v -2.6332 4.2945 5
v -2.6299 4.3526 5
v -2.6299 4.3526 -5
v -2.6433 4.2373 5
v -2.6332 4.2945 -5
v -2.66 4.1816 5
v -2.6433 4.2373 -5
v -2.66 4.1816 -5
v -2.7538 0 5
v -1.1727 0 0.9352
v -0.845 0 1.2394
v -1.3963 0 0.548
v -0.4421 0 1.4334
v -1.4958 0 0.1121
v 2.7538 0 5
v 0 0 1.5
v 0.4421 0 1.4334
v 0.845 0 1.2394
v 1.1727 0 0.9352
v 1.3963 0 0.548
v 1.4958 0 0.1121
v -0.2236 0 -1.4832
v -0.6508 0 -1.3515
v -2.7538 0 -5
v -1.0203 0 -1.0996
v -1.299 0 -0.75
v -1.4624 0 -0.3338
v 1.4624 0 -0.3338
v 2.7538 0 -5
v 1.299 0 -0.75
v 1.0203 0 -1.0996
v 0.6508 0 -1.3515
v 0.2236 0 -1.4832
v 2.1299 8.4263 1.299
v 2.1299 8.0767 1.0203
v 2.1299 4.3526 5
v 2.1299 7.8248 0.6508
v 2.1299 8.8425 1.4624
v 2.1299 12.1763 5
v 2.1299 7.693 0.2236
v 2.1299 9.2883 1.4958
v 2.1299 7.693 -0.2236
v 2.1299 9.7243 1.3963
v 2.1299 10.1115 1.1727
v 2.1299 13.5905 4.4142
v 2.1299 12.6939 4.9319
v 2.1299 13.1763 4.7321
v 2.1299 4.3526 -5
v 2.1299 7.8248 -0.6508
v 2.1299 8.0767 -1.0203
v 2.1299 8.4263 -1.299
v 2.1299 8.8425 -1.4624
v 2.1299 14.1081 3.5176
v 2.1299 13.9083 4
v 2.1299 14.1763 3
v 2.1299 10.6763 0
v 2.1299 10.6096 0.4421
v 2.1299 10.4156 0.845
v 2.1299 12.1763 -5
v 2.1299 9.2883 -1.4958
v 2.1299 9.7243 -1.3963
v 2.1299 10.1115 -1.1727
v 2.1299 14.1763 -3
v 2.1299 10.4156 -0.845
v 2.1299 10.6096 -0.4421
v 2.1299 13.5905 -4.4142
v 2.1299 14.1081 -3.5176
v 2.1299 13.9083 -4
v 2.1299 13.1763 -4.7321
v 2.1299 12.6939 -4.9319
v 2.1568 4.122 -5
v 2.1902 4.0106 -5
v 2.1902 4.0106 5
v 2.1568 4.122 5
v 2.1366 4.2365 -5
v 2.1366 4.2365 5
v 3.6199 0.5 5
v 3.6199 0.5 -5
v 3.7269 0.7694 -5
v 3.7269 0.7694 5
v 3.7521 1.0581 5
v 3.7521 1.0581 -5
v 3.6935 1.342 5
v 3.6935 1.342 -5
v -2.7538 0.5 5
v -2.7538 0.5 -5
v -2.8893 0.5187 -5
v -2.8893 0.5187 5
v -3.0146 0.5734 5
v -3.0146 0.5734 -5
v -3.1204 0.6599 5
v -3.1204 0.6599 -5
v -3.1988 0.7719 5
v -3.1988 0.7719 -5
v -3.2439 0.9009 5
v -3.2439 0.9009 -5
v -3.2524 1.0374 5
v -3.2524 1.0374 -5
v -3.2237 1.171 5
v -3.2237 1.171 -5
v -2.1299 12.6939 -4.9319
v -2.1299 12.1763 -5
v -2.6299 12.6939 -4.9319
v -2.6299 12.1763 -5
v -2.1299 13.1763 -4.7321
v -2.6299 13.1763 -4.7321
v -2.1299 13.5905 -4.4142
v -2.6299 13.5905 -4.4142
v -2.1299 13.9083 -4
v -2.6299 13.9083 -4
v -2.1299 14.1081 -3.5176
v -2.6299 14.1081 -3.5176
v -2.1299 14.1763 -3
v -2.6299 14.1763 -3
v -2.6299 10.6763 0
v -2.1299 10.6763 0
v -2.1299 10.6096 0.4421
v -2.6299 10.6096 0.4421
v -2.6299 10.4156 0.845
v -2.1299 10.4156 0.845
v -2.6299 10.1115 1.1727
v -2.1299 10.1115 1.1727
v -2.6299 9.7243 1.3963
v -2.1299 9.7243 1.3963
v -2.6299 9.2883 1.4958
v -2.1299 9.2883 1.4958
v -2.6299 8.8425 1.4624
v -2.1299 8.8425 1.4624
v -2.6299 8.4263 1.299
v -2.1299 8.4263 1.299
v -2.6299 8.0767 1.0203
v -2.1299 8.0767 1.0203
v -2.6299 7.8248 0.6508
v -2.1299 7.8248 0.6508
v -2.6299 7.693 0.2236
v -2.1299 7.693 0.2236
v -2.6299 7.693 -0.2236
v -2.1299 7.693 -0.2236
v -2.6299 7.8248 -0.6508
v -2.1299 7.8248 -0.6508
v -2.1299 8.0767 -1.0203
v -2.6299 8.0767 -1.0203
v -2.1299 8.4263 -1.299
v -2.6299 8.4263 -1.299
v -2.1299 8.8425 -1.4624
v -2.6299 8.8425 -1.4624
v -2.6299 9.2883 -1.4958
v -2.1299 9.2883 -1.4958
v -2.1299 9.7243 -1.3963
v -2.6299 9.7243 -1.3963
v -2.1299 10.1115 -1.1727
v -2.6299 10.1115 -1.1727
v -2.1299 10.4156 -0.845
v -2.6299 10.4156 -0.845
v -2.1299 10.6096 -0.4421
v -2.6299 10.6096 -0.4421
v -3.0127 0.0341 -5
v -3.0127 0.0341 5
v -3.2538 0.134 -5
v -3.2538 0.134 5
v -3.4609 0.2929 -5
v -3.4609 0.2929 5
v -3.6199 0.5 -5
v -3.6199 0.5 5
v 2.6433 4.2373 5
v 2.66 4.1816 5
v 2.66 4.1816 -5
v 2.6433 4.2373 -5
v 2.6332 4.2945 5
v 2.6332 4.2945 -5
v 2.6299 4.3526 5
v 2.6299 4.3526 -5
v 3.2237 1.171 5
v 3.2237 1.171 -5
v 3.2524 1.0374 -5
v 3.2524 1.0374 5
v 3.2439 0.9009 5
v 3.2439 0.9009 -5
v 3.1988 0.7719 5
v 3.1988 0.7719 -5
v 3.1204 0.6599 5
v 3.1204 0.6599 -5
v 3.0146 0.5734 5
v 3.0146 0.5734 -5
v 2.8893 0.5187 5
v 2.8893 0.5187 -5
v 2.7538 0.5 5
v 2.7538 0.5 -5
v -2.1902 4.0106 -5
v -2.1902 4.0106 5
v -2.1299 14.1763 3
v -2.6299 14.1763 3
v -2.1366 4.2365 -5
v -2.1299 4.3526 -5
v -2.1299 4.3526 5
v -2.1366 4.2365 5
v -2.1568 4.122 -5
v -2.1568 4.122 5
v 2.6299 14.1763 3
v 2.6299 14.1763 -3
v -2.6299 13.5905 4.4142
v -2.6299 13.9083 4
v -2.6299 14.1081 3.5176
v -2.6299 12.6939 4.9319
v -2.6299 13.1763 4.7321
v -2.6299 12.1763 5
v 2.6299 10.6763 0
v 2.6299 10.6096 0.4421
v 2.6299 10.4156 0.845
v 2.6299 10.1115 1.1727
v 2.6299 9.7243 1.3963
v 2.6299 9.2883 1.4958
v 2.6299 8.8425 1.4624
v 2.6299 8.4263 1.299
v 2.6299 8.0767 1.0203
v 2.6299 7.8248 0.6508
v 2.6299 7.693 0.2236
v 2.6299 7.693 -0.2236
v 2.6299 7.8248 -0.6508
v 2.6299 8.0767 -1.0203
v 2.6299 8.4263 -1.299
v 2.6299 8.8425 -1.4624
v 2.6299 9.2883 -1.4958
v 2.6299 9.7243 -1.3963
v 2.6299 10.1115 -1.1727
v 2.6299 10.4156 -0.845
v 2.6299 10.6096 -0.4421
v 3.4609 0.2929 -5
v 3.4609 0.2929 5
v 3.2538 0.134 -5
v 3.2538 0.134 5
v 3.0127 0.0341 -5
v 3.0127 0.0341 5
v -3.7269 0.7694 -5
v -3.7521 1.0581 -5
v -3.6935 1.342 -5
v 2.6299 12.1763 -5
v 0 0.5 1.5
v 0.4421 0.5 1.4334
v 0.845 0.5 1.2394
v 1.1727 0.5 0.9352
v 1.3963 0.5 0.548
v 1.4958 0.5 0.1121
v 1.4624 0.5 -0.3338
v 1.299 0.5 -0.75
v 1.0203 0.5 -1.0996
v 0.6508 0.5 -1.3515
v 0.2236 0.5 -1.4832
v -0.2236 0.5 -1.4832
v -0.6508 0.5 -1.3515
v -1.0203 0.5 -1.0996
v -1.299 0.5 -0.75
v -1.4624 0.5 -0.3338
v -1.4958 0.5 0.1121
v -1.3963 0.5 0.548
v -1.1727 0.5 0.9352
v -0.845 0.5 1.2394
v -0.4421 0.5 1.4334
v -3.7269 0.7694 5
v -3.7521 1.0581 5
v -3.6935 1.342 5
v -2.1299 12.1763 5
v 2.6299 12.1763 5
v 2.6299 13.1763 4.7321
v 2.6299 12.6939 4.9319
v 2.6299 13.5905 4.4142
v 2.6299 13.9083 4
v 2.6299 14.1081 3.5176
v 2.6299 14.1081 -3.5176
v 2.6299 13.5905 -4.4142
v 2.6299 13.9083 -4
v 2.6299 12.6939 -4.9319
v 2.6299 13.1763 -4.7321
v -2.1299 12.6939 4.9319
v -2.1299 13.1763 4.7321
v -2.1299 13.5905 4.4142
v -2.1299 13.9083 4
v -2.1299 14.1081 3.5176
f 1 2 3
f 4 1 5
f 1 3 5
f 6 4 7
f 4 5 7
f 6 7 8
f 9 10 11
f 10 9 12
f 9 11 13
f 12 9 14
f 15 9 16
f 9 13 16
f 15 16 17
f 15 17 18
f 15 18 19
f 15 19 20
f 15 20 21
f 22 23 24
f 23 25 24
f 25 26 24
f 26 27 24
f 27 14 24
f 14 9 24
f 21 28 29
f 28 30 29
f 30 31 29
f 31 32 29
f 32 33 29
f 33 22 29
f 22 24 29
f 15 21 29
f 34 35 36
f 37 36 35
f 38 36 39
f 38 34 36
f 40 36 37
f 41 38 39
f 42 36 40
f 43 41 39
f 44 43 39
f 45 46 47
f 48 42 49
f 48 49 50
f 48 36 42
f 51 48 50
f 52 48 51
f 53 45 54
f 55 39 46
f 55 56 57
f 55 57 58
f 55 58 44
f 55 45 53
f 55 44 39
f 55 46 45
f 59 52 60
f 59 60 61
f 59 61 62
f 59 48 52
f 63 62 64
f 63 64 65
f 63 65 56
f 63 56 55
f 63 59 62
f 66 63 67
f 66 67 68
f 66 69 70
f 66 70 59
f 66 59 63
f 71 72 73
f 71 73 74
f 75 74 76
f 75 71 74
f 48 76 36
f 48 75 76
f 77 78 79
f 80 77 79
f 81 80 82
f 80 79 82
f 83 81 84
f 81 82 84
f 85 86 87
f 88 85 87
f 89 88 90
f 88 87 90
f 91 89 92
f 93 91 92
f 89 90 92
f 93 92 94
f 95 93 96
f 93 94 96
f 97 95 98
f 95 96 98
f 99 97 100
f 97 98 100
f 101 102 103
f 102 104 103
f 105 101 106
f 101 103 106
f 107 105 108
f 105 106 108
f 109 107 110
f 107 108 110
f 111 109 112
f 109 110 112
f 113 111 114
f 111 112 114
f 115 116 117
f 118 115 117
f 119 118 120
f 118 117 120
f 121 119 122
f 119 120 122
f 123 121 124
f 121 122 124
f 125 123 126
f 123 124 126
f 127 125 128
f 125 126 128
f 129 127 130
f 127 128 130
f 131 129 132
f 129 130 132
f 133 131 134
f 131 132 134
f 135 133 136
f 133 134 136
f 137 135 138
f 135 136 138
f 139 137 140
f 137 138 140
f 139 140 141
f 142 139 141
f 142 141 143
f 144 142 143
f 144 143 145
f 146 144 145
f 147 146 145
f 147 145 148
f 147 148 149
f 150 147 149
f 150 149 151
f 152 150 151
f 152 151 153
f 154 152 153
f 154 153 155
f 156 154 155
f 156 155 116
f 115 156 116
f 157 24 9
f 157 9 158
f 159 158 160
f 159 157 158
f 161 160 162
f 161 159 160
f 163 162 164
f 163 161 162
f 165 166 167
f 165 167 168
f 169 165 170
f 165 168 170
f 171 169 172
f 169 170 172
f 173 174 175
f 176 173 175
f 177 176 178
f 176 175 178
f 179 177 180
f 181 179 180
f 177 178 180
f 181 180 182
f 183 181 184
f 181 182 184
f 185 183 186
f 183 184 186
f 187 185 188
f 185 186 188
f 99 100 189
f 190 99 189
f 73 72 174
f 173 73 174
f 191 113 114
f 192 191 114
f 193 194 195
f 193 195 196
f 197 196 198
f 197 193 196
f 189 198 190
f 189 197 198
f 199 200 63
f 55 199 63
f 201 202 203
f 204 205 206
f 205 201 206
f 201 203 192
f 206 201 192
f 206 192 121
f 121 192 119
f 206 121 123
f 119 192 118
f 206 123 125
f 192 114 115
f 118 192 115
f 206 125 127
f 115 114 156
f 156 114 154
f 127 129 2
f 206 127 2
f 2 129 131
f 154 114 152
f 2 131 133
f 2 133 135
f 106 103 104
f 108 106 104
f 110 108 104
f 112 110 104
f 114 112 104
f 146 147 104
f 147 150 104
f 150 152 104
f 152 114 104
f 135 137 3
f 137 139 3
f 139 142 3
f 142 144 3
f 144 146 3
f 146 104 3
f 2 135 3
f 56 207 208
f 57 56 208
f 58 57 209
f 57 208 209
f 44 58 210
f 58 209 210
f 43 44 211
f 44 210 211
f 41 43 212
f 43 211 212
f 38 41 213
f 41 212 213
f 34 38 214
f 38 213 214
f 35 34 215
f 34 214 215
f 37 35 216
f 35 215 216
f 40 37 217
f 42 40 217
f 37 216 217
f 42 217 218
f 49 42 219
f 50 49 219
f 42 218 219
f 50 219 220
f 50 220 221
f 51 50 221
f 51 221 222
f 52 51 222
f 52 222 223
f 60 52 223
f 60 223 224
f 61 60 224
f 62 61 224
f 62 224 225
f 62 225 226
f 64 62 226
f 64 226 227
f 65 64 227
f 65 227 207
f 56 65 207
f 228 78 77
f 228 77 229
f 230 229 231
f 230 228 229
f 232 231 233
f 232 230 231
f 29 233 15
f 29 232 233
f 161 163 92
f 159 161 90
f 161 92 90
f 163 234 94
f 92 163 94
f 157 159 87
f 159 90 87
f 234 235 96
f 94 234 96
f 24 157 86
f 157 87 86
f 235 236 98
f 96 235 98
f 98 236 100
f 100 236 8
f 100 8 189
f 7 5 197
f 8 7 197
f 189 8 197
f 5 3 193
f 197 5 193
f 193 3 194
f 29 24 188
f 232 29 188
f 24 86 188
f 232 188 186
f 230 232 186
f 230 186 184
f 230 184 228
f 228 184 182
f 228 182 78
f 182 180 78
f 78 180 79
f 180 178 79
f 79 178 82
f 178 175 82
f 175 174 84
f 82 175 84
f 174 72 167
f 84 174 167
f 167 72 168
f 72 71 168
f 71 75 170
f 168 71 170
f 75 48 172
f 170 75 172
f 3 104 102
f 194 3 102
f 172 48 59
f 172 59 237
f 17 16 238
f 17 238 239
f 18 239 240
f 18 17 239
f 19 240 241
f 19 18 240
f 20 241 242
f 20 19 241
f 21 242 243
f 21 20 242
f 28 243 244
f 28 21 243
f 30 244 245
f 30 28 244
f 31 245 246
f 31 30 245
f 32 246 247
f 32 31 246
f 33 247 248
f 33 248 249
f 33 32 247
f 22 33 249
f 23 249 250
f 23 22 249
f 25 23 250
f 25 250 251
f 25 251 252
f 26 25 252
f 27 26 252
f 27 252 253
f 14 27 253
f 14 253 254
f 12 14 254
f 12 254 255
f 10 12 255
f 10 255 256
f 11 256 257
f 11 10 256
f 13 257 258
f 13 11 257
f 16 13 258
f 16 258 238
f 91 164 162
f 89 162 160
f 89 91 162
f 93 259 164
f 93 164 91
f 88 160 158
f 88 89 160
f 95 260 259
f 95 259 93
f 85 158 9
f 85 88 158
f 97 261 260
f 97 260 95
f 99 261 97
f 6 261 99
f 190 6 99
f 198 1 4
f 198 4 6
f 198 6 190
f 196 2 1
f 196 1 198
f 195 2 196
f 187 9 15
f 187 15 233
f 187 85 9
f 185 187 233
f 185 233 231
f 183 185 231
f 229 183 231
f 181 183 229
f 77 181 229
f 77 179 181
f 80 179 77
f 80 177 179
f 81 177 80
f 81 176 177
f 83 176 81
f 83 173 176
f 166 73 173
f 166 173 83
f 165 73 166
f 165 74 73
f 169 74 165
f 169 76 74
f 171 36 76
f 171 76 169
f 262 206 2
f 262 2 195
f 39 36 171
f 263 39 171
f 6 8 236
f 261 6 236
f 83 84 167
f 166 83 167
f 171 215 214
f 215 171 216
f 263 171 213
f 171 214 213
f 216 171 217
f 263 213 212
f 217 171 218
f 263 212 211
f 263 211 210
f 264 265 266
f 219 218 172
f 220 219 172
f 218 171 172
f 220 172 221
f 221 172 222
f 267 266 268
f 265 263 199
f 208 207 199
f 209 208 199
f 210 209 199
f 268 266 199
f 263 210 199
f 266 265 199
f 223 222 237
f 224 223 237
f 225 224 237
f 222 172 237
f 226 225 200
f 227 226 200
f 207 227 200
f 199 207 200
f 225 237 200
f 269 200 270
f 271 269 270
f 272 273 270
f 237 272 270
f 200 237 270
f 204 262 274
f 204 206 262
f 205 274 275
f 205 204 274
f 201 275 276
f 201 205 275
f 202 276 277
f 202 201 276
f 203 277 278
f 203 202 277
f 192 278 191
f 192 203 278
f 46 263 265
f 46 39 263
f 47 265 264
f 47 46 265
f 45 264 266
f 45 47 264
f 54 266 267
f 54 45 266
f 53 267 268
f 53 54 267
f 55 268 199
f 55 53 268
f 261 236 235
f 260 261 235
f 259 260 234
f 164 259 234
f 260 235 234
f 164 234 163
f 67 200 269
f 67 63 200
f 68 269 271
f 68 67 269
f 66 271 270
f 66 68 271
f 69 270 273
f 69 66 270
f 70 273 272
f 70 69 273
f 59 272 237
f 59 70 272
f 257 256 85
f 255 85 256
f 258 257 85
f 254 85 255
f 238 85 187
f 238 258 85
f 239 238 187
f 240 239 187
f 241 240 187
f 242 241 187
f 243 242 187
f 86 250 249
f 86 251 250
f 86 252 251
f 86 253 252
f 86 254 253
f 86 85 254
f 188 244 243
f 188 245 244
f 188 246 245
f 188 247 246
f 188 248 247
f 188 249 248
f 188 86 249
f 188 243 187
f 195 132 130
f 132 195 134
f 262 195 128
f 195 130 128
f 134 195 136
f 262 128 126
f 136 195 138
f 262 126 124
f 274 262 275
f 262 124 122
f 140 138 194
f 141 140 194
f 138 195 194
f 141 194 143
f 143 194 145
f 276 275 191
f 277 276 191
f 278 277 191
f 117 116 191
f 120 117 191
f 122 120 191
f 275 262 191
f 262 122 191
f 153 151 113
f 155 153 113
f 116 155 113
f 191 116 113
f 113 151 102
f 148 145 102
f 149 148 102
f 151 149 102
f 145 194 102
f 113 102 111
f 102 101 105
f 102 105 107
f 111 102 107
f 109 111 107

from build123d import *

# Parameters (mm, degrees)
SKETCH_1_W               = 8
SKETCH_1_H               = 10
SKETCH_1_R               = 1.5
EXTRUDE_1_DEPTH          = 0.5
SM_START                 = -5
SM_EDGE_FLANGE_1_DEPTH   = 10
SM_EDGE_FLANGE_1_2_DEPTH = 10
SM_EDGE_FLANGE_2_DEPTH   = 10
SM_EDGE_FLANGE_2_2_DEPTH = 10
FILLET_1_R               = 2
SKETCH_18_R              = 1.5
CUT_EXTRUDE_1_DEPTH      = 10


# Read off the part's stored shape, not the designer's step: Ребро-кромка1, Ребро-кромка2
with BuildPart() as part:
    # Sketch 1 → Бобышка-Вытянуть1 (new body)
    with BuildSketch(Plane(origin=(0, 0, 0), x_dir=(1, 0, 0), z_dir=(0, 1, 0))):
        Rectangle(SKETCH_1_W, SKETCH_1_H)
        with Locations(Location((0, 0, 0), (0, 0, 270))):
            Circle(SKETCH_1_R, mode=Mode.SUBTRACT)
    extrude(amount=EXTRUDE_1_DEPTH)

    # Ребро-кромка1 outline → Ребро-кромка1 (cut)
    with BuildSketch(Plane.XY.offset(SM_START)):
        with BuildLine():
            ThreePointArc((-2.75383711, 0), (-3.25383711, 0.133974596), (-3.619862514, 0.5))
            Line((-3.619862514, 0.5), (-4, 0.5))
            Line((-4, 0.5), (-4, 0))
            Line((-4, 0), (-2.75383711, 0))
        make_face()
        with BuildLine():
            ThreePointArc((3.619862514, 0.5), (3.25383711, 0.133974596), (2.75383711, 0))
            Line((2.75383711, 0), (4, 0))
            Line((4, 0), (4, 0.5))
            Line((4, 0.5), (3.619862514, 0.5))
        make_face()
    extrude(amount=SM_EDGE_FLANGE_1_DEPTH, mode=Mode.SUBTRACT)

    # Sm Edge Flange 1 2 outline → Sm Edge Flange 1 2 (add)
    with BuildSketch(Plane.XY.offset(SM_START)):
        with BuildLine():
            Line((-2.129864257, 5.638155725), (-3.693529731, 1.342020143))
            ThreePointArc((-3.693529731, 1.342020143), (-3.750031808, 0.912844257), (-3.619862514, 0.5))
            Line((-3.619862514, 0.5), (-2.75383711, 0.5))
            ThreePointArc((-2.75383711, 0.5), (-3.163413133, 0.713211782), (-3.223683421, 1.171010072))
            Line((-3.223683421, 1.171010072), (-1.660017947, 5.467145653))
            Line((-1.660017947, 5.467145653), (-2.129864257, 5.638155725))
        make_face()
        with BuildLine():
            ThreePointArc((3.223683421, 1.171010072), (3.163413133, 0.713211782), (2.75383711, 0.5))
            Line((2.75383711, 0.5), (3.619862514, 0.5))
            ThreePointArc((3.619862514, 0.5), (3.750031808, 0.912844257), (3.693529731, 1.342020143))
            Line((3.693529731, 1.342020143), (2.129864257, 5.638155725))
            Line((2.129864257, 5.638155725), (1.660017947, 5.467145653))
            Line((1.660017947, 5.467145653), (3.223683421, 1.171010072))
        make_face()
    extrude(amount=SM_EDGE_FLANGE_1_2_DEPTH)

    # Ребро-кромка2 outline → Ребро-кромка2 (cut)
    with BuildSketch(Plane.XY.offset(SM_START)):
        with BuildLine():
            Line((-2.129864257, 5.638155725), (-2.129864257, 4.352580505))
            ThreePointArc((-2.129864257, 4.352580505), (-2.145056504, 4.178932328), (-2.190171636, 4.010560362))
            Line((-2.190171636, 4.010560362), (-1.660017947, 5.467145653))
            Line((-1.660017947, 5.467145653), (-2.129864257, 5.638155725))
        make_face()
        with BuildLine():
            Line((2.129864257, 4.352580505), (2.129864257, 5.638155725))
            Line((2.129864257, 5.638155725), (1.660017947, 5.467145653))
            Line((1.660017947, 5.467145653), (2.190171636, 4.010560362))
            ThreePointArc((2.190171636, 4.010560362), (2.145056504, 4.178932328), (2.129864257, 4.352580505))
        make_face()
    extrude(amount=SM_EDGE_FLANGE_2_DEPTH, mode=Mode.SUBTRACT)

    # Sm Edge Flange 2 2 outline → Sm Edge Flange 2 2 (add)
    with BuildSketch(Plane.XY.offset(SM_START)):
        with BuildLine():
            Line((-2.660017947, 4.181570434), (-2.129864257, 5.638155725))
            Line((-2.129864257, 5.638155725), (-2.129864257, 14.176253525))
            Line((-2.129864257, 14.176253525), (-2.629864257, 14.176253525))
            Line((-2.629864257, 14.176253525), (-2.629864257, 4.352580505))
            ThreePointArc((-2.629864257, 4.352580505), (-2.637460381, 4.265756417), (-2.660017947, 4.181570434))
        make_face()
        with BuildLine():
            Line((2.629864257, 4.352580505), (2.629864257, 14.176253525))
            Line((2.629864257, 14.176253525), (2.129864257, 14.176253525))
            Line((2.129864257, 14.176253525), (2.129864257, 5.638155725))
            Line((2.129864257, 5.638155725), (2.660017947, 4.181570434))
            ThreePointArc((2.660017947, 4.181570434), (2.637460381, 4.265756417), (2.629864257, 4.352580505))
        make_face()
    extrude(amount=SM_EDGE_FLANGE_2_2_DEPTH)

    # Скругление1
    fillet_1_edges = [part.edges().sort_by_distance(p)[0] for p in [
        (-2.379864257, 14.176253525, 5),
        (-2.379864257, 14.176253525, -5),
        (2.379864257, 14.176253525, -5),
        (2.379864257, 14.176253525, 5),
    ]]
    fillet(fillet_1_edges, radius=FILLET_1_R)

    # Эскиз18 → Вырез-Вытянуть1 (cut)
    with BuildSketch(Plane(origin=(2.629864257, 0, 0), x_dir=(0, 0, -1), z_dir=(1, 0, 0))):
        with Locations(Location((0, 9.176253525, 0), (0, 0, 90))):
            Circle(SKETCH_18_R)
    extrude(amount=-CUT_EXTRUDE_1_DEPTH, mode=Mode.SUBTRACT)


solid = part.part
